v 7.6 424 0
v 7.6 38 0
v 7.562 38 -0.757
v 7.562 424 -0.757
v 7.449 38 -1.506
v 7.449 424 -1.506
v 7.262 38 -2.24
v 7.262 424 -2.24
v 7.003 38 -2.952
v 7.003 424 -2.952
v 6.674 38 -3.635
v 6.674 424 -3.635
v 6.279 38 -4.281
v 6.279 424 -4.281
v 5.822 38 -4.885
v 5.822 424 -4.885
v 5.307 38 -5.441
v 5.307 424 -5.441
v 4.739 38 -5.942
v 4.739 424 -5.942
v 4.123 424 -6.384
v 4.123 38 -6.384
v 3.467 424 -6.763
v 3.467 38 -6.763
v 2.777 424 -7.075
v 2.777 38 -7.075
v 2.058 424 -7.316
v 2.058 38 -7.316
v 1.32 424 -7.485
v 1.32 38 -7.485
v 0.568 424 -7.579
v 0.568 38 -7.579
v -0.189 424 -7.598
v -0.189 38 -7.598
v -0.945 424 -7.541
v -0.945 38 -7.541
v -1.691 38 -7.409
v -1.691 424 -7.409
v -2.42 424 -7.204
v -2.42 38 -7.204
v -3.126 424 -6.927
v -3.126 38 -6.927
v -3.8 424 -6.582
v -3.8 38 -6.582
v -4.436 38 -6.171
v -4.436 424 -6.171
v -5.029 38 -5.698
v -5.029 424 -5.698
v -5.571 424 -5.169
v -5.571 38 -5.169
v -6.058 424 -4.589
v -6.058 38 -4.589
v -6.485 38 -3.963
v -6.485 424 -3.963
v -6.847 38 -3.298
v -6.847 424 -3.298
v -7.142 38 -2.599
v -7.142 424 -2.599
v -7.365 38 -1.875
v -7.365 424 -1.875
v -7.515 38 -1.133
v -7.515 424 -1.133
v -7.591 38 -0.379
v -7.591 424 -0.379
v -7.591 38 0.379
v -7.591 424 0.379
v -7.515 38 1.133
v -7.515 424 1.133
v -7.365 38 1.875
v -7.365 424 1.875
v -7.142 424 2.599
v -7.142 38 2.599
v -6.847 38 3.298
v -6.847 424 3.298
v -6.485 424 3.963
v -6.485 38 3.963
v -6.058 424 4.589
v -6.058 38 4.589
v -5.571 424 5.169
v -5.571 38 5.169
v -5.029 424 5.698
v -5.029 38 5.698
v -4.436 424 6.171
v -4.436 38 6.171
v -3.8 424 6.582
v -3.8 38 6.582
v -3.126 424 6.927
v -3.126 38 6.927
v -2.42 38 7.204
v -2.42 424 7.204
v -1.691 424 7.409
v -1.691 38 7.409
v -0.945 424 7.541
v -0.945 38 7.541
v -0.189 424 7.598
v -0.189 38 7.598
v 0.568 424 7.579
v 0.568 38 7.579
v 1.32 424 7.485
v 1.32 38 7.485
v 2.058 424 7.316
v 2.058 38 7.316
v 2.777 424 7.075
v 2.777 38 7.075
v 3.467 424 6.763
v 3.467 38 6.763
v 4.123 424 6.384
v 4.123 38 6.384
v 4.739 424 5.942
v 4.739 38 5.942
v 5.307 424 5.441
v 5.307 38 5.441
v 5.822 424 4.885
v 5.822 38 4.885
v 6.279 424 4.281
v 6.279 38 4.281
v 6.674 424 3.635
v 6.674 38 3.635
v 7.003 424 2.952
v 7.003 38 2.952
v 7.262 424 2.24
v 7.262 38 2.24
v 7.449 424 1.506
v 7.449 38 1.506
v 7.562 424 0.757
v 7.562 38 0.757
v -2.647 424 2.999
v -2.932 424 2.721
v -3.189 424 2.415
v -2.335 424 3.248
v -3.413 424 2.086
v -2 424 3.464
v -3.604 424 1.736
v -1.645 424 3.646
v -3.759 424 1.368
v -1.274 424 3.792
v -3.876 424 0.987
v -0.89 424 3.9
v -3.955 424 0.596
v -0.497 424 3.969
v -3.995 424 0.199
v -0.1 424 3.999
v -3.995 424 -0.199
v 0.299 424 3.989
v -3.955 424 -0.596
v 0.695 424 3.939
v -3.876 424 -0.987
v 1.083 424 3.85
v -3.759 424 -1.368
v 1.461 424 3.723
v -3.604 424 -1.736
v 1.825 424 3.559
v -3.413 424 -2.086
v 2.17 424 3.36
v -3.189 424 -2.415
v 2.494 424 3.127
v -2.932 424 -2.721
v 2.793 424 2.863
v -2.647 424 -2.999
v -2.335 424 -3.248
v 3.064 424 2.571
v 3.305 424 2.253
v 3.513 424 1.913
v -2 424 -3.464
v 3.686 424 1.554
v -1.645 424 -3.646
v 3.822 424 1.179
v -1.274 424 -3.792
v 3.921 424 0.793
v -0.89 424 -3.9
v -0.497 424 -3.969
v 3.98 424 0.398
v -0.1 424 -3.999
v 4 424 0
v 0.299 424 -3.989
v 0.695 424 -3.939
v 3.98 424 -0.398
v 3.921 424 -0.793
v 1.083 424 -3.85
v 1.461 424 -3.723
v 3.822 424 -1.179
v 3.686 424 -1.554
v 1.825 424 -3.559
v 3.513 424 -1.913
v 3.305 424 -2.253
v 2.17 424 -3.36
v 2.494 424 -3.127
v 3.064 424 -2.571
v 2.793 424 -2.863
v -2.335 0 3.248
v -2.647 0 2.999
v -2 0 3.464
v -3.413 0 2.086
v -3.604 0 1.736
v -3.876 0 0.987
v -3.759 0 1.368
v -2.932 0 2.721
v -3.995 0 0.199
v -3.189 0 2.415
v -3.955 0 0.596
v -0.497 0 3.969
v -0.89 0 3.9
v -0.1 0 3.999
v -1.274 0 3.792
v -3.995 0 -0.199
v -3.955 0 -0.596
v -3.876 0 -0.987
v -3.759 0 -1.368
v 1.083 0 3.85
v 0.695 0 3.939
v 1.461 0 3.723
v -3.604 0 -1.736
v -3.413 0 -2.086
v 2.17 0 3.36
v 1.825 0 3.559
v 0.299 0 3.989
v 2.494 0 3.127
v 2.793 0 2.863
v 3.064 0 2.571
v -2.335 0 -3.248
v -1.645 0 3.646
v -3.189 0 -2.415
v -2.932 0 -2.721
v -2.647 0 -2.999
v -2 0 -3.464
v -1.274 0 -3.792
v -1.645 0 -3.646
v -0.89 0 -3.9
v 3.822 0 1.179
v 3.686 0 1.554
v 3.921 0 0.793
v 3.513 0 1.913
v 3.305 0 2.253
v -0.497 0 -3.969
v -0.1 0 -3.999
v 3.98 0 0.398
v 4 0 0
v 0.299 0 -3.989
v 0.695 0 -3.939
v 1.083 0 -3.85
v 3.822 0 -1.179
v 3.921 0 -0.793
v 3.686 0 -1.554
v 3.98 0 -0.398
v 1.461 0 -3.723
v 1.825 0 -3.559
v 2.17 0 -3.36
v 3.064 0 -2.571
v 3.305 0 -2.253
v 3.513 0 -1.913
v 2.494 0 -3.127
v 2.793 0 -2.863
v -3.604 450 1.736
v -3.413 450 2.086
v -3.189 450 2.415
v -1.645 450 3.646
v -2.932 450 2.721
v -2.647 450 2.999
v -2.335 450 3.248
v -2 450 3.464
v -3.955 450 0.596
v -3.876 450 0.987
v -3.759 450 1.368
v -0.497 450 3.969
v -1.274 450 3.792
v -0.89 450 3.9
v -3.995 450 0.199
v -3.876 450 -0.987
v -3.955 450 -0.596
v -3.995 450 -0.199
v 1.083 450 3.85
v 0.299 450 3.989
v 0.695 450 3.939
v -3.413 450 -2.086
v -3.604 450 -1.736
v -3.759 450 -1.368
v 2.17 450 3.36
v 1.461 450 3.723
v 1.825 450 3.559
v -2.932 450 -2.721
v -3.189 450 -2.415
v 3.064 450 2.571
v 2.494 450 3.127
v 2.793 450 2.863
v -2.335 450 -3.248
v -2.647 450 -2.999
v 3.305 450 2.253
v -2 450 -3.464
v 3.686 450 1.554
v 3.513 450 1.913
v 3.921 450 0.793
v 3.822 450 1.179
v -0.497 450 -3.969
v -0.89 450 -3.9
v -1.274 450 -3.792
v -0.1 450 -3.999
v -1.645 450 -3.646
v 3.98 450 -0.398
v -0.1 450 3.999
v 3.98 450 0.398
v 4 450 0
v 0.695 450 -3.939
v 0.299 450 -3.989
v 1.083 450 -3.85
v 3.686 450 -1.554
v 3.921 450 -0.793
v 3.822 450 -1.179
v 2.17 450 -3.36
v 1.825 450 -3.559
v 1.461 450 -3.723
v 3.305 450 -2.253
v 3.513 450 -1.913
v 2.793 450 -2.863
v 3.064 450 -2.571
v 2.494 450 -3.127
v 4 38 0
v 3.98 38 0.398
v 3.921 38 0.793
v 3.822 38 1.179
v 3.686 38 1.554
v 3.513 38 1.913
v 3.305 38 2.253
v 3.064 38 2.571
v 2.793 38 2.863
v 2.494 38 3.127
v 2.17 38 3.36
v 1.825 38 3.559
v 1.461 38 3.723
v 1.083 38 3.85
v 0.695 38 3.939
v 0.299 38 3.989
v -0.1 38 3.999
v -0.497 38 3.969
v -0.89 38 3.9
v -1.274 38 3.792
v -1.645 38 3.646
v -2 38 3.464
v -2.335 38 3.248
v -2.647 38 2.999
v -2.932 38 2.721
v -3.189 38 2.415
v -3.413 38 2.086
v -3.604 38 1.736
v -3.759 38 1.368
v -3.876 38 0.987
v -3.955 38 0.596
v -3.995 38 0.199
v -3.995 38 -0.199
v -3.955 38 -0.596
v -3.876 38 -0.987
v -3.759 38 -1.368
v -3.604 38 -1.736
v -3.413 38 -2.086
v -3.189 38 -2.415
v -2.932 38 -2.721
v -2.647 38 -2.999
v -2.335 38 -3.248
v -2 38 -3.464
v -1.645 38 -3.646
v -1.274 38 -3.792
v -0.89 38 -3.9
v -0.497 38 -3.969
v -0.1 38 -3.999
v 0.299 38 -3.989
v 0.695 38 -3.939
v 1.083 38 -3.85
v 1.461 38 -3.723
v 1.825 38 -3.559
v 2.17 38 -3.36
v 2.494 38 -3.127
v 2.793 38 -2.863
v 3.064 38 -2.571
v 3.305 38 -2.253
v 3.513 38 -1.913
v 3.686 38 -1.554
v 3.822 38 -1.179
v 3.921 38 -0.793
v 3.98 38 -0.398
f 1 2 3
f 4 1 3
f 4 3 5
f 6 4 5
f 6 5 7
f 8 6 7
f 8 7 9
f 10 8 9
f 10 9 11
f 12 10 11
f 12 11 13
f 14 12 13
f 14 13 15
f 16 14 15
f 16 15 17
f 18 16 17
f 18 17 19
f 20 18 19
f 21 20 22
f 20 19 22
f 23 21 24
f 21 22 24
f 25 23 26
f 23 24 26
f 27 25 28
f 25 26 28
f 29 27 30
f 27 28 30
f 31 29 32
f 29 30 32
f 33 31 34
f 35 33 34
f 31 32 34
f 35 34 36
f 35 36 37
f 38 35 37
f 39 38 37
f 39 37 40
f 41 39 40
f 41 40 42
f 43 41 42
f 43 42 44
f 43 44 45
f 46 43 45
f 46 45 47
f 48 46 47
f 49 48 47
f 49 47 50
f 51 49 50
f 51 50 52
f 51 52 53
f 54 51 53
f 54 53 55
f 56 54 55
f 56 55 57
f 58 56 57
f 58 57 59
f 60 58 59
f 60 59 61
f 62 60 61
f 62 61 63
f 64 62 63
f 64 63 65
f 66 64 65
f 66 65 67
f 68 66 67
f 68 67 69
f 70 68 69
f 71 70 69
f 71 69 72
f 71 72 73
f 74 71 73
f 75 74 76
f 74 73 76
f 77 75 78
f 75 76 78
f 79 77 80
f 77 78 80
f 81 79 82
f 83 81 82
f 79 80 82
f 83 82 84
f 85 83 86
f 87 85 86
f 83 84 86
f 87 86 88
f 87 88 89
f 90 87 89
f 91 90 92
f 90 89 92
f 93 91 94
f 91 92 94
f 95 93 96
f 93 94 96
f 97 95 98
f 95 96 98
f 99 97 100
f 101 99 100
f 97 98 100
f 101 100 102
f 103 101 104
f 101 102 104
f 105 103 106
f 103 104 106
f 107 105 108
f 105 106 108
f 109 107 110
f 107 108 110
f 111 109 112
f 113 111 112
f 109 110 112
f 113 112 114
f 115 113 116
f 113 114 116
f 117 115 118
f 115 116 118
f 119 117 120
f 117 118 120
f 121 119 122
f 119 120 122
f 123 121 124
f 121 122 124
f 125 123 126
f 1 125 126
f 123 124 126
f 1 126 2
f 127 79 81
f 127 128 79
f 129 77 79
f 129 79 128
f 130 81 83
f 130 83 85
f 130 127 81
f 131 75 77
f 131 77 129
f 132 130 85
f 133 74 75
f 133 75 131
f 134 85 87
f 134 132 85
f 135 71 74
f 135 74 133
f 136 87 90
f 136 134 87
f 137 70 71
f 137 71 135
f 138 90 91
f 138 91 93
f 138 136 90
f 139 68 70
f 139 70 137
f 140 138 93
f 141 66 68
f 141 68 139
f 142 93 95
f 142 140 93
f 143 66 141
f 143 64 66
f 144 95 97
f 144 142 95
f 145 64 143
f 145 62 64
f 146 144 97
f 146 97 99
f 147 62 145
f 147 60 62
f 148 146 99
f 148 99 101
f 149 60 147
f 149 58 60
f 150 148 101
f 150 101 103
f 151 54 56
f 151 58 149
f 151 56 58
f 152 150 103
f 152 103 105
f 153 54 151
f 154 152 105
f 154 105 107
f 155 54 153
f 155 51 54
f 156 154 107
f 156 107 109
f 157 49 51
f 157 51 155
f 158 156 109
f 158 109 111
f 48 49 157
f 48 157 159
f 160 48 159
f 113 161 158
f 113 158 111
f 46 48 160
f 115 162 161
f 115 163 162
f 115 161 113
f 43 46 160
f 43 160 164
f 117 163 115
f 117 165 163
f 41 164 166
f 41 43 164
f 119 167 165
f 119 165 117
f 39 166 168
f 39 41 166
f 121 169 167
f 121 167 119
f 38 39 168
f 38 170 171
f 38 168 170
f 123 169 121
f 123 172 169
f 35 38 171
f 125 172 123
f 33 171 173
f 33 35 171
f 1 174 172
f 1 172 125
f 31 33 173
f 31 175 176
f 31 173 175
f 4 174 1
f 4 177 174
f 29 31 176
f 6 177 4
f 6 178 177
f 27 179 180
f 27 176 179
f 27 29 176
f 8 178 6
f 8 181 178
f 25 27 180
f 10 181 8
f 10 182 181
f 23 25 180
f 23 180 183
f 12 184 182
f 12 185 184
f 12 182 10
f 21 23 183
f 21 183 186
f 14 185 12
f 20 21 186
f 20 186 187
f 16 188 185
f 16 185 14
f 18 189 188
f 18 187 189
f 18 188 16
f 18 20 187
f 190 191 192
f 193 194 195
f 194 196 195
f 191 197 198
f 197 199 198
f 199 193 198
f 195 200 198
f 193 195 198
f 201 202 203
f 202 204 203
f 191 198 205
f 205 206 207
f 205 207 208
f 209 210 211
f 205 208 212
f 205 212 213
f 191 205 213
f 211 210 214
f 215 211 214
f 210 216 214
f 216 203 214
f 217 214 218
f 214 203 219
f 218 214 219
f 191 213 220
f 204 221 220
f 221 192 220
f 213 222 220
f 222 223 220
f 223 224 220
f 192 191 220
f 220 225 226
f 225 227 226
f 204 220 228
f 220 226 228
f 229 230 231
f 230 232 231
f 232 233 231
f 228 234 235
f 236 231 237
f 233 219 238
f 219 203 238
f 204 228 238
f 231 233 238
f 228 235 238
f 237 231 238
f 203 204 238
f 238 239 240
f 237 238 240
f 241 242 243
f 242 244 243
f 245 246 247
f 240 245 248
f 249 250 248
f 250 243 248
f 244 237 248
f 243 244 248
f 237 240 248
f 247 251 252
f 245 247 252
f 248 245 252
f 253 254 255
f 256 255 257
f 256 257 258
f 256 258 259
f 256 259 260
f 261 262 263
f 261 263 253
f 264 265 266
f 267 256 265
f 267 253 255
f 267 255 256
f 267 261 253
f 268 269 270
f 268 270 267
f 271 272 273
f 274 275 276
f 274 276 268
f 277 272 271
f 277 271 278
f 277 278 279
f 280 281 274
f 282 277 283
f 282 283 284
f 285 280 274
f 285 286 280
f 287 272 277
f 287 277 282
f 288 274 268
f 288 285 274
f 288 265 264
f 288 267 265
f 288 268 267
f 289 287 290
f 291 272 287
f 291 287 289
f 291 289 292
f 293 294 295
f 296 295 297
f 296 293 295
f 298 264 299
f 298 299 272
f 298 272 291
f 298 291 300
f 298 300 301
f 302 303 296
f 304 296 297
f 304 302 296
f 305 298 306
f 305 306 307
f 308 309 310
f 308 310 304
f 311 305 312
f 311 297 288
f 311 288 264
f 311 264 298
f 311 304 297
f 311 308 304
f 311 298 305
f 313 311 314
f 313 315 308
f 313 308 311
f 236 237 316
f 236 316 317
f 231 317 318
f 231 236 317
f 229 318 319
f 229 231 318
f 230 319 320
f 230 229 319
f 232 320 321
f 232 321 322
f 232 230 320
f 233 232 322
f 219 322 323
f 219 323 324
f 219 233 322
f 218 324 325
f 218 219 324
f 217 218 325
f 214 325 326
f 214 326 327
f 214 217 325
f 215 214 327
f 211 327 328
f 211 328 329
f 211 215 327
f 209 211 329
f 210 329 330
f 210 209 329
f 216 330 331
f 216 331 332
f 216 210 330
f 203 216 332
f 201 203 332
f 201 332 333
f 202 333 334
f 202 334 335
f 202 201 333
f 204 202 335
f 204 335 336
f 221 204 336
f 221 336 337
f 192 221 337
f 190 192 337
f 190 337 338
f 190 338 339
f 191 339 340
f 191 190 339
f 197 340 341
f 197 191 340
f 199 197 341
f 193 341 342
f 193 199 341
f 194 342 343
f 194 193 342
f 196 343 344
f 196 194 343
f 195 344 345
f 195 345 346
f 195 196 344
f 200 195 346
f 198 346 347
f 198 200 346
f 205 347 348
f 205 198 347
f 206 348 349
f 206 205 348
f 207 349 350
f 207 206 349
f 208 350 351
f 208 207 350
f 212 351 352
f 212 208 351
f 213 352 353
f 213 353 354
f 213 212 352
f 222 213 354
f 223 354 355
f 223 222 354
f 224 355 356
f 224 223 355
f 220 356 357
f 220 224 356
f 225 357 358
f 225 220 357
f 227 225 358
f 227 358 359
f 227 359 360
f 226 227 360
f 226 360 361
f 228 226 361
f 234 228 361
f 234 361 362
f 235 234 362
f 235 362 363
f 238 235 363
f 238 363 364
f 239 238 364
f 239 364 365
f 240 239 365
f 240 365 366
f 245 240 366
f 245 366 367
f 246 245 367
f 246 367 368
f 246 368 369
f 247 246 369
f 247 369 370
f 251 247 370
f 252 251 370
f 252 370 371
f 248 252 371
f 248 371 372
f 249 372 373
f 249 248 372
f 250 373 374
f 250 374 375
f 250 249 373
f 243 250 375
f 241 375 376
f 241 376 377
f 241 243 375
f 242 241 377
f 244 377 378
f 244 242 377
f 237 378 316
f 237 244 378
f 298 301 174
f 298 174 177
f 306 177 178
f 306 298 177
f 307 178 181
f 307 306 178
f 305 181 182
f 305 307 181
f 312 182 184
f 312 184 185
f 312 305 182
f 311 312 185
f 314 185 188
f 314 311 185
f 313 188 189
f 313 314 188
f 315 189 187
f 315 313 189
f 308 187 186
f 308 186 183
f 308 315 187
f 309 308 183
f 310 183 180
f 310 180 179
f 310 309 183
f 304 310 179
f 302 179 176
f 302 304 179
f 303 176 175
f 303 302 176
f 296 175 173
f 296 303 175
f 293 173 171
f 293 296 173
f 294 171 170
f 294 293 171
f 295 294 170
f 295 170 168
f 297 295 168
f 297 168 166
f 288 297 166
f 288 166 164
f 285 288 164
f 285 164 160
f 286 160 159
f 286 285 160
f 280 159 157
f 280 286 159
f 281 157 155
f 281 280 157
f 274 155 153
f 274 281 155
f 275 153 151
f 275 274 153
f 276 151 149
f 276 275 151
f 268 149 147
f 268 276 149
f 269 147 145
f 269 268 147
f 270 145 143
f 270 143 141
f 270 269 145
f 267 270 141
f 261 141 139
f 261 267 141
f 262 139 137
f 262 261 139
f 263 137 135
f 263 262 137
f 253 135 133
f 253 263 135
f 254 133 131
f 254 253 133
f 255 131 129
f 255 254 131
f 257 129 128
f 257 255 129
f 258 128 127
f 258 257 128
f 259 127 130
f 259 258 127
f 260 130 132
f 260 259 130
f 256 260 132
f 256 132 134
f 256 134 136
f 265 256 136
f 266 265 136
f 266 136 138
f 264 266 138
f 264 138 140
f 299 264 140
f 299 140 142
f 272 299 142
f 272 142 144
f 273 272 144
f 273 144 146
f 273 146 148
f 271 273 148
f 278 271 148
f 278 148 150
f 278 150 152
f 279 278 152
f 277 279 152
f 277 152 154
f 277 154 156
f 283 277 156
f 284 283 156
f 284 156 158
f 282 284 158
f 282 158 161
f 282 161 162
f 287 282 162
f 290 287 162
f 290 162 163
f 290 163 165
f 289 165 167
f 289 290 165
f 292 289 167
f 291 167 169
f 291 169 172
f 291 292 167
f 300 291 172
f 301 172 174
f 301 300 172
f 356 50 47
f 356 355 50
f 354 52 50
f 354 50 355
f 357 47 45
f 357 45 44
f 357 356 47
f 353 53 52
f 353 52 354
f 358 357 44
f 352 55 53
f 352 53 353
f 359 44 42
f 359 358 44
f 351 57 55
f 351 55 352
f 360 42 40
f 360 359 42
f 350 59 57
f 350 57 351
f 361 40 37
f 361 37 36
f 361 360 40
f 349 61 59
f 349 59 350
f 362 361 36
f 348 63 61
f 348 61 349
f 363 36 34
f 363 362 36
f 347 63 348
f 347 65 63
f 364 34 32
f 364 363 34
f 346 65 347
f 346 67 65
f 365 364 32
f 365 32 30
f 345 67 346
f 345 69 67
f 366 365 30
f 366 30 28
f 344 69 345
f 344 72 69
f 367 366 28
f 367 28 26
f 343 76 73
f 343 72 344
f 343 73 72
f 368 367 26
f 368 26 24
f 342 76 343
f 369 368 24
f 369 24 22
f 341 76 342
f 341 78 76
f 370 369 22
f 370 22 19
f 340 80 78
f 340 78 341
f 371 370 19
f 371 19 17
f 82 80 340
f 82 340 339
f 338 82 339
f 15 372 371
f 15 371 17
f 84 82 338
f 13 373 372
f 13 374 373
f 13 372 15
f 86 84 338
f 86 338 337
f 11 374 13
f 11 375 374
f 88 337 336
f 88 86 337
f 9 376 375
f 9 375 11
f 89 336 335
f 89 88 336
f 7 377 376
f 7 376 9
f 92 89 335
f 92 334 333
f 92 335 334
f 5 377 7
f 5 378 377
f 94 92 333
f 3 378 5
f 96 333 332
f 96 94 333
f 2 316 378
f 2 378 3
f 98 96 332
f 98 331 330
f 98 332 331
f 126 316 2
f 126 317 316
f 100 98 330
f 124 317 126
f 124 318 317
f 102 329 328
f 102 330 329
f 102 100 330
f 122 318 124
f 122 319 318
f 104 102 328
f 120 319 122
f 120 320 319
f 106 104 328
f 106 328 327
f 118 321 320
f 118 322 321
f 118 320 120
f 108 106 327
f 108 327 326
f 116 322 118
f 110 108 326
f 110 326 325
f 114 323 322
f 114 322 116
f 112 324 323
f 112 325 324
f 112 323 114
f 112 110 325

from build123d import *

# Parameters (mm, degrees)
SKETCH_1_R          = 7.6
EXTRUDE_1_DEPTH     = 450
SKETCH_2_R          = 7.6
SKETCH_2_R_2        = 4
CUT_EXTRUDE_1_DEPTH = 26
SKETCH_3_R          = 7.6
SKETCH_3_R_2        = 4
CUT_EXTRUDE_2_DEPTH = 38


with BuildPart() as part:
    # Эскиз1 → Бобышка-Вытянуть1 (new body)
    with BuildSketch(Plane(origin=(0, 0, 0), x_dir=(1, 0, 0), z_dir=(0, 1, 0))):
        Circle(SKETCH_1_R)
    extrude(amount=EXTRUDE_1_DEPTH)

    # Эскиз2 → Вырез-Вытянуть1 (cut)
    with BuildSketch(Plane(origin=(0, 450, 0), x_dir=(1, 0, 0), z_dir=(0, 1, 0))):
        Circle(SKETCH_2_R)
        Circle(SKETCH_2_R_2, mode=Mode.SUBTRACT)
    extrude(amount=-CUT_EXTRUDE_1_DEPTH, mode=Mode.SUBTRACT)

    # Эскиз3 → Вырез-Вытянуть2 (cut)
    with BuildSketch(Plane.XZ):
        Circle(SKETCH_3_R)
        Circle(SKETCH_3_R_2, mode=Mode.SUBTRACT)
    extrude(amount=-CUT_EXTRUDE_2_DEPTH, mode=Mode.SUBTRACT)


solid = part.part
